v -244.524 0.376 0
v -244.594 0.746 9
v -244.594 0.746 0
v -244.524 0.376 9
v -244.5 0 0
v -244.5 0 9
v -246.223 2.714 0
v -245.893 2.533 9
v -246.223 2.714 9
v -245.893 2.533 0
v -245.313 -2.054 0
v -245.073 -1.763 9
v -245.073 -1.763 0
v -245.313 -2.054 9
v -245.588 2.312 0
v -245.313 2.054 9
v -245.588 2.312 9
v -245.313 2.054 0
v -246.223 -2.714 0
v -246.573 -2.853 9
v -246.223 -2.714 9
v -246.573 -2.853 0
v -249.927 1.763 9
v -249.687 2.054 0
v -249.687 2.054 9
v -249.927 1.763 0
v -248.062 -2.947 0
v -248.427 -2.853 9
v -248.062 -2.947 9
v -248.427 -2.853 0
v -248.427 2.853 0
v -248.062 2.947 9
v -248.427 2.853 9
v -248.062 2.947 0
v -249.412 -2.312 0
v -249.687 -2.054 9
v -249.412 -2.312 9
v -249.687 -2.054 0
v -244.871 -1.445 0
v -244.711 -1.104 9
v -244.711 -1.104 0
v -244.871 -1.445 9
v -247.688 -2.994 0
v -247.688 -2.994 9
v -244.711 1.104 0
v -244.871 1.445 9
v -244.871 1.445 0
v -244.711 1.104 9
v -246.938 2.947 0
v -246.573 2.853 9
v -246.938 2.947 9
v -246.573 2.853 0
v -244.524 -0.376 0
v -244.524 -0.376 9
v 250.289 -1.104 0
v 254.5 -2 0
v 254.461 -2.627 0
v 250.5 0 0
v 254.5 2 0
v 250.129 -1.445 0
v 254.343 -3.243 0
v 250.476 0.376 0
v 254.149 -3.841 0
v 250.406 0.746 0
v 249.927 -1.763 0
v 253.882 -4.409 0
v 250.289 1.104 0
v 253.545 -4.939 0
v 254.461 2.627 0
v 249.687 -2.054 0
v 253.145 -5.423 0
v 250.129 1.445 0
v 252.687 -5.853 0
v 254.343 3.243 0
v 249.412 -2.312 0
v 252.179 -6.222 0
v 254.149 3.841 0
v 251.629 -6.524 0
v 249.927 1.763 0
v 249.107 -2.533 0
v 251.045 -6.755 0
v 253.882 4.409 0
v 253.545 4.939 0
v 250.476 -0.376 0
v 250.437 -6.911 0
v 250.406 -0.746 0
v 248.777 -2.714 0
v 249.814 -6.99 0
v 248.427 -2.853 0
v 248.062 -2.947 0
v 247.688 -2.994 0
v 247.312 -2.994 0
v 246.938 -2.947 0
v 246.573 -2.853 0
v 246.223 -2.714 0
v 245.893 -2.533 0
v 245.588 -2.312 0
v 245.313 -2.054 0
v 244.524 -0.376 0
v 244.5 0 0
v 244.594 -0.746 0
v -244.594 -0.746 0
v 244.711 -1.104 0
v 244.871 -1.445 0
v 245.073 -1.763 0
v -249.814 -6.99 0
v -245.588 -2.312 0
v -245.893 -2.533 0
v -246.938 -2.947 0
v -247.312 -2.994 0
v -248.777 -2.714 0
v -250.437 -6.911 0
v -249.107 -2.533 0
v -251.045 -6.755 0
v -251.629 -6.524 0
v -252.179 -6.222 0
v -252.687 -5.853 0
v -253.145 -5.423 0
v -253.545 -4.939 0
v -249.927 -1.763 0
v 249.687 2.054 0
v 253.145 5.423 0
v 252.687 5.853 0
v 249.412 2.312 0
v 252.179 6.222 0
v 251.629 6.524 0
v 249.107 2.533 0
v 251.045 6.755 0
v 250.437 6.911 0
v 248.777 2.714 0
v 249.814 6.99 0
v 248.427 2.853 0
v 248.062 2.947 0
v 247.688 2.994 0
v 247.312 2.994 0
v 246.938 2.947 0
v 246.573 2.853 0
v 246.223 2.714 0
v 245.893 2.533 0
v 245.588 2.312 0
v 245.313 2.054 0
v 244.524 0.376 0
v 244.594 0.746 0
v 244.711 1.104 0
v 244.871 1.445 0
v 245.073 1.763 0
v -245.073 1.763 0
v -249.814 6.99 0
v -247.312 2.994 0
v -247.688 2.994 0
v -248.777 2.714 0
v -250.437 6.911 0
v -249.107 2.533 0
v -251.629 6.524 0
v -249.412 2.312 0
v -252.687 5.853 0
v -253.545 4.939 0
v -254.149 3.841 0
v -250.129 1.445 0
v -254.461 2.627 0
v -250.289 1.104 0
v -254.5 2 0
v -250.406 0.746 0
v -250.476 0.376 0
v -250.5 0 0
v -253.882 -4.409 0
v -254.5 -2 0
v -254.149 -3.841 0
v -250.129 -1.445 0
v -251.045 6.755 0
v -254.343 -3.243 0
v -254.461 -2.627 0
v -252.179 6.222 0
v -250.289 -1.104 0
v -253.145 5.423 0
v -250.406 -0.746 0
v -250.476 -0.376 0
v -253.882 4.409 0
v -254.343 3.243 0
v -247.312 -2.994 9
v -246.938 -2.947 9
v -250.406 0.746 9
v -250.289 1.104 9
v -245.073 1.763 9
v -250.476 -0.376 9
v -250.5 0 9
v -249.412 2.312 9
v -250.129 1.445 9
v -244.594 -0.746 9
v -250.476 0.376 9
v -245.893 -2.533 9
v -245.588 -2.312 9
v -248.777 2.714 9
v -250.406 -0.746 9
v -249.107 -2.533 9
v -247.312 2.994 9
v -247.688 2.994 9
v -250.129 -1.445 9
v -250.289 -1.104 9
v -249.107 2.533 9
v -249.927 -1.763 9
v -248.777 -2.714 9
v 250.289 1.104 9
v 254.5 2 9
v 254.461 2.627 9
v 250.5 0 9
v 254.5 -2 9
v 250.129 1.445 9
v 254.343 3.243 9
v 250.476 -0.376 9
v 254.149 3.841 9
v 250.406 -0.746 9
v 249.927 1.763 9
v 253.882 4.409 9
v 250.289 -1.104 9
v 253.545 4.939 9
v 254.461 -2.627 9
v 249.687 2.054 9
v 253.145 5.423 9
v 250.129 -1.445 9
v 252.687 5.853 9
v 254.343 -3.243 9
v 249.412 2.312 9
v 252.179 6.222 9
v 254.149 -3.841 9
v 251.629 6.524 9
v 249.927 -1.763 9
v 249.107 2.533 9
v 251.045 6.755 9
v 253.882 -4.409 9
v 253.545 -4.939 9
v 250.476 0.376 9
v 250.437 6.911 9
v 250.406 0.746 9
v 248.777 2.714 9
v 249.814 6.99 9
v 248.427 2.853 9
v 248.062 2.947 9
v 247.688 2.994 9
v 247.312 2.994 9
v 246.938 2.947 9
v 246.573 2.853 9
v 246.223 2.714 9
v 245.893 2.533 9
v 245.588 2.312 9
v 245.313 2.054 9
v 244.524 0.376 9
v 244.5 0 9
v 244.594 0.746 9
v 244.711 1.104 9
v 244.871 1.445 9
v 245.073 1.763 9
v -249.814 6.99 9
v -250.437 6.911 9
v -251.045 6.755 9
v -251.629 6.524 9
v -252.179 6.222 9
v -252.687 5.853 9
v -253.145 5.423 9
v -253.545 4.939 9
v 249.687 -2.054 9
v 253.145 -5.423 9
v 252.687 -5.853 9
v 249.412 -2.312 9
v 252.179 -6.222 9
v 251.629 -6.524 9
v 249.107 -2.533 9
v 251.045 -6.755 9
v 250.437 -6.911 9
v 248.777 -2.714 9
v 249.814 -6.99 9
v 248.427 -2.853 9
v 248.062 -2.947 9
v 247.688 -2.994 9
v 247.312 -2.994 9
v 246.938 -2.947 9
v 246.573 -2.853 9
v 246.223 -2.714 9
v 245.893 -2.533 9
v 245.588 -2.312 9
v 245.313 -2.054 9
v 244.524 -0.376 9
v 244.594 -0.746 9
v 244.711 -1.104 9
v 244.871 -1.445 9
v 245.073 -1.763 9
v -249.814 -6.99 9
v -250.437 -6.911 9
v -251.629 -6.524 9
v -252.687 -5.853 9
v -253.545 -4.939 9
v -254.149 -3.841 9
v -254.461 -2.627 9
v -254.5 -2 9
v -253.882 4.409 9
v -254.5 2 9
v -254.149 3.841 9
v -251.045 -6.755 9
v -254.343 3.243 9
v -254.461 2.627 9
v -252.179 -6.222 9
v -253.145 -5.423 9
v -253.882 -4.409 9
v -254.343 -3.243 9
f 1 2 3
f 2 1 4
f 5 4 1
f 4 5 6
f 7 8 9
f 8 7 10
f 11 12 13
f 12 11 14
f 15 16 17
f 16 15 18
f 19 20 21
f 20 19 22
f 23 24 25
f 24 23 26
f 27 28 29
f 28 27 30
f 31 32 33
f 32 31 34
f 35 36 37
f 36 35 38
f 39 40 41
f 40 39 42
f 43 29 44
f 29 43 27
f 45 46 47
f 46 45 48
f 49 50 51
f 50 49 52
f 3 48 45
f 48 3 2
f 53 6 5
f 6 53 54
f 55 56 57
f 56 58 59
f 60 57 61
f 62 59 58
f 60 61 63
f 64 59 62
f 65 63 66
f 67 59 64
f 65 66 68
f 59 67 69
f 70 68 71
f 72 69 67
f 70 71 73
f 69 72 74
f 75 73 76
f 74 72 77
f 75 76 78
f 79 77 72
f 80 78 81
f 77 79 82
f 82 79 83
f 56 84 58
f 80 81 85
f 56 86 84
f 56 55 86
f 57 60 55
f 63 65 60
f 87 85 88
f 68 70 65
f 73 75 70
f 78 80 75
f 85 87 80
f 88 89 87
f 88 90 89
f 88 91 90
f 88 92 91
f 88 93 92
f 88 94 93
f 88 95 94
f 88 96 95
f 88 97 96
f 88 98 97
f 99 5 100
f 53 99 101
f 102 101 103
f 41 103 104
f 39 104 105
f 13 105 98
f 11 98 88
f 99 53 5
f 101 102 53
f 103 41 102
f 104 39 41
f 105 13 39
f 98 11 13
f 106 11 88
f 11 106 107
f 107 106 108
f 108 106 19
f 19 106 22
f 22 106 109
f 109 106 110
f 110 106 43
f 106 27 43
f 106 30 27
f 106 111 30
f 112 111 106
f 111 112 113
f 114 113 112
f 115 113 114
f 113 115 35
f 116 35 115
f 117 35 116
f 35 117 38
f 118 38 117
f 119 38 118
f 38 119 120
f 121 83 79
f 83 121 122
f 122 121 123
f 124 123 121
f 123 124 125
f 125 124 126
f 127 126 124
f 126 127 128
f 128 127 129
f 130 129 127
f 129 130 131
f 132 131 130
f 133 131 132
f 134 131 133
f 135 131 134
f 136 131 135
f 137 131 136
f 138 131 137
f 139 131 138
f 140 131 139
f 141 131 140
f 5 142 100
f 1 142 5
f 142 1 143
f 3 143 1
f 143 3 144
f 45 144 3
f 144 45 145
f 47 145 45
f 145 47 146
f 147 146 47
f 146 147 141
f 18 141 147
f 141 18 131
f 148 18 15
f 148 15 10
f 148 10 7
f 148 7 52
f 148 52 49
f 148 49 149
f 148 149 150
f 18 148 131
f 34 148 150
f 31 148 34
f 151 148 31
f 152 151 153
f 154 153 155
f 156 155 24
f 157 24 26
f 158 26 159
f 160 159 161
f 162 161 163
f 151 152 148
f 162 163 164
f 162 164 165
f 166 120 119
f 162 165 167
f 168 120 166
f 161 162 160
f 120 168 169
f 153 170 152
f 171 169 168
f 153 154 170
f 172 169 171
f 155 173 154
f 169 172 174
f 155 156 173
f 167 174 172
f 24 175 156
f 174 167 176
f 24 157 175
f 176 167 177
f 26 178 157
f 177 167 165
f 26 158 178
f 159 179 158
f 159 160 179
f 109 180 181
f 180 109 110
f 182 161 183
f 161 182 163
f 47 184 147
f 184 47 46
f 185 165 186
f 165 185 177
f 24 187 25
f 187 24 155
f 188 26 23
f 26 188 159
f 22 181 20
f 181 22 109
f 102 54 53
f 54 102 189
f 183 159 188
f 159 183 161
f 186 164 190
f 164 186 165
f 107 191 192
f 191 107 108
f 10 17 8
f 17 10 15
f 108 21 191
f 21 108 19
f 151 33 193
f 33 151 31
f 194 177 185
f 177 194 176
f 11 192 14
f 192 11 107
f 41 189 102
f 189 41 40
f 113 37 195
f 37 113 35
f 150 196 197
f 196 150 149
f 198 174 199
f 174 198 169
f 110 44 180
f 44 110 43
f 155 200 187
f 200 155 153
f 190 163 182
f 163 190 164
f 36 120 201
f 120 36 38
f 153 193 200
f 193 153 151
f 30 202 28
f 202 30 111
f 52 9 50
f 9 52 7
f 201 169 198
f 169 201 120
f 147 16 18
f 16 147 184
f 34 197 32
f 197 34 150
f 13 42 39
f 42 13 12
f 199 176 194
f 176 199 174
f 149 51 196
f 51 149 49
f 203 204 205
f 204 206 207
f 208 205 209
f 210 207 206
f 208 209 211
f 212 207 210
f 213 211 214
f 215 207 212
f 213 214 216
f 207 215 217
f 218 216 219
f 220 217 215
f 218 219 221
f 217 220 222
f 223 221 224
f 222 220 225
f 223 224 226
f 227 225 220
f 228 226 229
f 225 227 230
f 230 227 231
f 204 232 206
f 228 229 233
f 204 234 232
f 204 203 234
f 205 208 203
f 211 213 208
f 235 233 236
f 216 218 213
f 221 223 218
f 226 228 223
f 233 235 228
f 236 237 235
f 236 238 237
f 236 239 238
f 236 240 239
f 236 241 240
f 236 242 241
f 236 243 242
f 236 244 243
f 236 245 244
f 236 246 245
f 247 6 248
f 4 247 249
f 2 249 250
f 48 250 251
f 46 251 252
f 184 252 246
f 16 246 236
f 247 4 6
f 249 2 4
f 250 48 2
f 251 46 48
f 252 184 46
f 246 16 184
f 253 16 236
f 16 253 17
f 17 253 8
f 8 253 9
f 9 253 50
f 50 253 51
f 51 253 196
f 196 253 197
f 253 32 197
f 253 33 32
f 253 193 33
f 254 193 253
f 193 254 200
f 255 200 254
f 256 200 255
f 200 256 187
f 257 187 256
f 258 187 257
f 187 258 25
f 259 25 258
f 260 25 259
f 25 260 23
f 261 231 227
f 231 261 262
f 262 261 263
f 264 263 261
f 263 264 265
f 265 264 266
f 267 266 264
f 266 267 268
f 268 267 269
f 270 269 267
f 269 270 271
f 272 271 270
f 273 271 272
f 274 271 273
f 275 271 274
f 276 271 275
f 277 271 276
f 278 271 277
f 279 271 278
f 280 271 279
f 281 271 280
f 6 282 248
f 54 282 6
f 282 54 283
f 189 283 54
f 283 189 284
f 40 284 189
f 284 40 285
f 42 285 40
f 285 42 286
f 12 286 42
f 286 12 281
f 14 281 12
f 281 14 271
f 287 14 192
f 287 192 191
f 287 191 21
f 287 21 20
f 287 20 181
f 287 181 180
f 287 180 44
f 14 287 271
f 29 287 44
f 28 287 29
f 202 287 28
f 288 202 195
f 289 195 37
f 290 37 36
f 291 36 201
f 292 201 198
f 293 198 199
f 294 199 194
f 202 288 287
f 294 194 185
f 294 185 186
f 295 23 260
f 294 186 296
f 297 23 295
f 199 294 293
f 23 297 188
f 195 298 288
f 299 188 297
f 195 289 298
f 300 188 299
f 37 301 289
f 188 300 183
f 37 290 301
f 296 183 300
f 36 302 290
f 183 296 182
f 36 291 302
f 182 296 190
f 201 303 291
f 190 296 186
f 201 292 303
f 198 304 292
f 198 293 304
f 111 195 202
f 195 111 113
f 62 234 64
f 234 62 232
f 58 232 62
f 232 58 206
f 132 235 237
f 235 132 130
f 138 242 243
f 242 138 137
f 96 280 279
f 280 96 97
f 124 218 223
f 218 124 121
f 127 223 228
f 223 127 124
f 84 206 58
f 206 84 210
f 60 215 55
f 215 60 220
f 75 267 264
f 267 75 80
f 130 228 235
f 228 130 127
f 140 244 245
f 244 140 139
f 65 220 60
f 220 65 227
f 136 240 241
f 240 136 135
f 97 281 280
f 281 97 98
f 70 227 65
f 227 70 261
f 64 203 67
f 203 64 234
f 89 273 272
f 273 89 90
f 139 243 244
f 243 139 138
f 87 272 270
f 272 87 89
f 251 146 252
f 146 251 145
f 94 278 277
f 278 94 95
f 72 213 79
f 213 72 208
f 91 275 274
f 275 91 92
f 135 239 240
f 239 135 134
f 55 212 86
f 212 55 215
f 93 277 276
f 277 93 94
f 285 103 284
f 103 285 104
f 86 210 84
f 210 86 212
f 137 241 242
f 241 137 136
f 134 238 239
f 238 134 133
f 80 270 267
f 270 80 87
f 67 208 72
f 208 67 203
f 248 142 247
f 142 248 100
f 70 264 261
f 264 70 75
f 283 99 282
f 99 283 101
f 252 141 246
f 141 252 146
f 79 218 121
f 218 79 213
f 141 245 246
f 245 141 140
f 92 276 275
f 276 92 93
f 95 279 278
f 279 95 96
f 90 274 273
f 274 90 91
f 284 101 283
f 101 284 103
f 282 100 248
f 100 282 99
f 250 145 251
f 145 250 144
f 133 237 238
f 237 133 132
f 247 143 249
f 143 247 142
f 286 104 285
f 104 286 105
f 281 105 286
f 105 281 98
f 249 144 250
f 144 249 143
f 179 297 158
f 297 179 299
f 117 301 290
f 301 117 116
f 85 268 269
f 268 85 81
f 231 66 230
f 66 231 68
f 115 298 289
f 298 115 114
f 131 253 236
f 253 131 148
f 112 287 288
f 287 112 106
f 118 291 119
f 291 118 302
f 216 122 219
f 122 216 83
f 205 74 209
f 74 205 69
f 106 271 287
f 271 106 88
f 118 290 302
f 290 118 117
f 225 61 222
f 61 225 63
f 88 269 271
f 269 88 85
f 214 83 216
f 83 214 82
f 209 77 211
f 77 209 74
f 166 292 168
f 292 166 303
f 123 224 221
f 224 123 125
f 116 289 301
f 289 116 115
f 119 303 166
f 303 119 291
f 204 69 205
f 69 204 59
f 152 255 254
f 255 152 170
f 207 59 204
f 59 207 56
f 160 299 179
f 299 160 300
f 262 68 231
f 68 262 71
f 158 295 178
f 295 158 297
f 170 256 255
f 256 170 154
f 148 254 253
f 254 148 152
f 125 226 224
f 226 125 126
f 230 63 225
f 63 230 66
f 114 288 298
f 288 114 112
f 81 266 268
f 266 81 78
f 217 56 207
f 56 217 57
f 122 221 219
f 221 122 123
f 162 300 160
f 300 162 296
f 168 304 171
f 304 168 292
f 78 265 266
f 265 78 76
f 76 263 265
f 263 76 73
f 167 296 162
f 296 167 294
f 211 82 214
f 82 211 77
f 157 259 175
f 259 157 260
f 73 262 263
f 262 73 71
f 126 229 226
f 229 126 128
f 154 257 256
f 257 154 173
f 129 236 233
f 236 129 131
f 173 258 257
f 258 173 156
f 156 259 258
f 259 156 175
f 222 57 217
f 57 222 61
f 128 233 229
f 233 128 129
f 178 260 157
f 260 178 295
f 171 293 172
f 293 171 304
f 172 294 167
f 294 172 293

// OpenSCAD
$fn = 50;


difference() {
	union() {
		hull() {
			translate(v = [-249.5000000000, 2.0000000000, 0]) {
				cylinder(h = 9, r = 5);
			}
			translate(v = [249.5000000000, 2.0000000000, 0]) {
				cylinder(h = 9, r = 5);
			}
			translate(v = [-249.5000000000, -2.0000000000, 0]) {
				cylinder(h = 9, r = 5);
			}
			translate(v = [249.5000000000, -2.0000000000, 0]) {
				cylinder(h = 9, r = 5);
			}
		}
	}
	union() {
		translate(v = [-247.5000000000, 0.0000000000, 0]) {
			cylinder(h = 9, r = 3.0000000000);
		}
		translate(v = [247.5000000000, 0.0000000000, 0]) {
			cylinder(h = 9, r = 3.0000000000);
		}
		translate(v = [-247.5000000000, 0.0000000000, 0]) {
			cylinder(h = 9, r = 1.5000000000);
		}
		translate(v = [247.5000000000, 0.0000000000, 0]) {
			cylinder(h = 9, r = 1.5000000000);
		}
		translate(v = [-247.5000000000, 0.0000000000, 0]) {
			cylinder(h = 9, r = 1.5000000000);
		}
		translate(v = [247.5000000000, 0.0000000000, 0]) {
			cylinder(h = 9, r = 1.5000000000);
		}
		translate(v = [-247.5000000000, 0.0000000000, 0]) {
			cylinder(h = 9, r = 1.5000000000);
		}
		translate(v = [247.5000000000, 0.0000000000, 0]) {
			cylinder(h = 9, r = 1.5000000000);
		}
	}
}
